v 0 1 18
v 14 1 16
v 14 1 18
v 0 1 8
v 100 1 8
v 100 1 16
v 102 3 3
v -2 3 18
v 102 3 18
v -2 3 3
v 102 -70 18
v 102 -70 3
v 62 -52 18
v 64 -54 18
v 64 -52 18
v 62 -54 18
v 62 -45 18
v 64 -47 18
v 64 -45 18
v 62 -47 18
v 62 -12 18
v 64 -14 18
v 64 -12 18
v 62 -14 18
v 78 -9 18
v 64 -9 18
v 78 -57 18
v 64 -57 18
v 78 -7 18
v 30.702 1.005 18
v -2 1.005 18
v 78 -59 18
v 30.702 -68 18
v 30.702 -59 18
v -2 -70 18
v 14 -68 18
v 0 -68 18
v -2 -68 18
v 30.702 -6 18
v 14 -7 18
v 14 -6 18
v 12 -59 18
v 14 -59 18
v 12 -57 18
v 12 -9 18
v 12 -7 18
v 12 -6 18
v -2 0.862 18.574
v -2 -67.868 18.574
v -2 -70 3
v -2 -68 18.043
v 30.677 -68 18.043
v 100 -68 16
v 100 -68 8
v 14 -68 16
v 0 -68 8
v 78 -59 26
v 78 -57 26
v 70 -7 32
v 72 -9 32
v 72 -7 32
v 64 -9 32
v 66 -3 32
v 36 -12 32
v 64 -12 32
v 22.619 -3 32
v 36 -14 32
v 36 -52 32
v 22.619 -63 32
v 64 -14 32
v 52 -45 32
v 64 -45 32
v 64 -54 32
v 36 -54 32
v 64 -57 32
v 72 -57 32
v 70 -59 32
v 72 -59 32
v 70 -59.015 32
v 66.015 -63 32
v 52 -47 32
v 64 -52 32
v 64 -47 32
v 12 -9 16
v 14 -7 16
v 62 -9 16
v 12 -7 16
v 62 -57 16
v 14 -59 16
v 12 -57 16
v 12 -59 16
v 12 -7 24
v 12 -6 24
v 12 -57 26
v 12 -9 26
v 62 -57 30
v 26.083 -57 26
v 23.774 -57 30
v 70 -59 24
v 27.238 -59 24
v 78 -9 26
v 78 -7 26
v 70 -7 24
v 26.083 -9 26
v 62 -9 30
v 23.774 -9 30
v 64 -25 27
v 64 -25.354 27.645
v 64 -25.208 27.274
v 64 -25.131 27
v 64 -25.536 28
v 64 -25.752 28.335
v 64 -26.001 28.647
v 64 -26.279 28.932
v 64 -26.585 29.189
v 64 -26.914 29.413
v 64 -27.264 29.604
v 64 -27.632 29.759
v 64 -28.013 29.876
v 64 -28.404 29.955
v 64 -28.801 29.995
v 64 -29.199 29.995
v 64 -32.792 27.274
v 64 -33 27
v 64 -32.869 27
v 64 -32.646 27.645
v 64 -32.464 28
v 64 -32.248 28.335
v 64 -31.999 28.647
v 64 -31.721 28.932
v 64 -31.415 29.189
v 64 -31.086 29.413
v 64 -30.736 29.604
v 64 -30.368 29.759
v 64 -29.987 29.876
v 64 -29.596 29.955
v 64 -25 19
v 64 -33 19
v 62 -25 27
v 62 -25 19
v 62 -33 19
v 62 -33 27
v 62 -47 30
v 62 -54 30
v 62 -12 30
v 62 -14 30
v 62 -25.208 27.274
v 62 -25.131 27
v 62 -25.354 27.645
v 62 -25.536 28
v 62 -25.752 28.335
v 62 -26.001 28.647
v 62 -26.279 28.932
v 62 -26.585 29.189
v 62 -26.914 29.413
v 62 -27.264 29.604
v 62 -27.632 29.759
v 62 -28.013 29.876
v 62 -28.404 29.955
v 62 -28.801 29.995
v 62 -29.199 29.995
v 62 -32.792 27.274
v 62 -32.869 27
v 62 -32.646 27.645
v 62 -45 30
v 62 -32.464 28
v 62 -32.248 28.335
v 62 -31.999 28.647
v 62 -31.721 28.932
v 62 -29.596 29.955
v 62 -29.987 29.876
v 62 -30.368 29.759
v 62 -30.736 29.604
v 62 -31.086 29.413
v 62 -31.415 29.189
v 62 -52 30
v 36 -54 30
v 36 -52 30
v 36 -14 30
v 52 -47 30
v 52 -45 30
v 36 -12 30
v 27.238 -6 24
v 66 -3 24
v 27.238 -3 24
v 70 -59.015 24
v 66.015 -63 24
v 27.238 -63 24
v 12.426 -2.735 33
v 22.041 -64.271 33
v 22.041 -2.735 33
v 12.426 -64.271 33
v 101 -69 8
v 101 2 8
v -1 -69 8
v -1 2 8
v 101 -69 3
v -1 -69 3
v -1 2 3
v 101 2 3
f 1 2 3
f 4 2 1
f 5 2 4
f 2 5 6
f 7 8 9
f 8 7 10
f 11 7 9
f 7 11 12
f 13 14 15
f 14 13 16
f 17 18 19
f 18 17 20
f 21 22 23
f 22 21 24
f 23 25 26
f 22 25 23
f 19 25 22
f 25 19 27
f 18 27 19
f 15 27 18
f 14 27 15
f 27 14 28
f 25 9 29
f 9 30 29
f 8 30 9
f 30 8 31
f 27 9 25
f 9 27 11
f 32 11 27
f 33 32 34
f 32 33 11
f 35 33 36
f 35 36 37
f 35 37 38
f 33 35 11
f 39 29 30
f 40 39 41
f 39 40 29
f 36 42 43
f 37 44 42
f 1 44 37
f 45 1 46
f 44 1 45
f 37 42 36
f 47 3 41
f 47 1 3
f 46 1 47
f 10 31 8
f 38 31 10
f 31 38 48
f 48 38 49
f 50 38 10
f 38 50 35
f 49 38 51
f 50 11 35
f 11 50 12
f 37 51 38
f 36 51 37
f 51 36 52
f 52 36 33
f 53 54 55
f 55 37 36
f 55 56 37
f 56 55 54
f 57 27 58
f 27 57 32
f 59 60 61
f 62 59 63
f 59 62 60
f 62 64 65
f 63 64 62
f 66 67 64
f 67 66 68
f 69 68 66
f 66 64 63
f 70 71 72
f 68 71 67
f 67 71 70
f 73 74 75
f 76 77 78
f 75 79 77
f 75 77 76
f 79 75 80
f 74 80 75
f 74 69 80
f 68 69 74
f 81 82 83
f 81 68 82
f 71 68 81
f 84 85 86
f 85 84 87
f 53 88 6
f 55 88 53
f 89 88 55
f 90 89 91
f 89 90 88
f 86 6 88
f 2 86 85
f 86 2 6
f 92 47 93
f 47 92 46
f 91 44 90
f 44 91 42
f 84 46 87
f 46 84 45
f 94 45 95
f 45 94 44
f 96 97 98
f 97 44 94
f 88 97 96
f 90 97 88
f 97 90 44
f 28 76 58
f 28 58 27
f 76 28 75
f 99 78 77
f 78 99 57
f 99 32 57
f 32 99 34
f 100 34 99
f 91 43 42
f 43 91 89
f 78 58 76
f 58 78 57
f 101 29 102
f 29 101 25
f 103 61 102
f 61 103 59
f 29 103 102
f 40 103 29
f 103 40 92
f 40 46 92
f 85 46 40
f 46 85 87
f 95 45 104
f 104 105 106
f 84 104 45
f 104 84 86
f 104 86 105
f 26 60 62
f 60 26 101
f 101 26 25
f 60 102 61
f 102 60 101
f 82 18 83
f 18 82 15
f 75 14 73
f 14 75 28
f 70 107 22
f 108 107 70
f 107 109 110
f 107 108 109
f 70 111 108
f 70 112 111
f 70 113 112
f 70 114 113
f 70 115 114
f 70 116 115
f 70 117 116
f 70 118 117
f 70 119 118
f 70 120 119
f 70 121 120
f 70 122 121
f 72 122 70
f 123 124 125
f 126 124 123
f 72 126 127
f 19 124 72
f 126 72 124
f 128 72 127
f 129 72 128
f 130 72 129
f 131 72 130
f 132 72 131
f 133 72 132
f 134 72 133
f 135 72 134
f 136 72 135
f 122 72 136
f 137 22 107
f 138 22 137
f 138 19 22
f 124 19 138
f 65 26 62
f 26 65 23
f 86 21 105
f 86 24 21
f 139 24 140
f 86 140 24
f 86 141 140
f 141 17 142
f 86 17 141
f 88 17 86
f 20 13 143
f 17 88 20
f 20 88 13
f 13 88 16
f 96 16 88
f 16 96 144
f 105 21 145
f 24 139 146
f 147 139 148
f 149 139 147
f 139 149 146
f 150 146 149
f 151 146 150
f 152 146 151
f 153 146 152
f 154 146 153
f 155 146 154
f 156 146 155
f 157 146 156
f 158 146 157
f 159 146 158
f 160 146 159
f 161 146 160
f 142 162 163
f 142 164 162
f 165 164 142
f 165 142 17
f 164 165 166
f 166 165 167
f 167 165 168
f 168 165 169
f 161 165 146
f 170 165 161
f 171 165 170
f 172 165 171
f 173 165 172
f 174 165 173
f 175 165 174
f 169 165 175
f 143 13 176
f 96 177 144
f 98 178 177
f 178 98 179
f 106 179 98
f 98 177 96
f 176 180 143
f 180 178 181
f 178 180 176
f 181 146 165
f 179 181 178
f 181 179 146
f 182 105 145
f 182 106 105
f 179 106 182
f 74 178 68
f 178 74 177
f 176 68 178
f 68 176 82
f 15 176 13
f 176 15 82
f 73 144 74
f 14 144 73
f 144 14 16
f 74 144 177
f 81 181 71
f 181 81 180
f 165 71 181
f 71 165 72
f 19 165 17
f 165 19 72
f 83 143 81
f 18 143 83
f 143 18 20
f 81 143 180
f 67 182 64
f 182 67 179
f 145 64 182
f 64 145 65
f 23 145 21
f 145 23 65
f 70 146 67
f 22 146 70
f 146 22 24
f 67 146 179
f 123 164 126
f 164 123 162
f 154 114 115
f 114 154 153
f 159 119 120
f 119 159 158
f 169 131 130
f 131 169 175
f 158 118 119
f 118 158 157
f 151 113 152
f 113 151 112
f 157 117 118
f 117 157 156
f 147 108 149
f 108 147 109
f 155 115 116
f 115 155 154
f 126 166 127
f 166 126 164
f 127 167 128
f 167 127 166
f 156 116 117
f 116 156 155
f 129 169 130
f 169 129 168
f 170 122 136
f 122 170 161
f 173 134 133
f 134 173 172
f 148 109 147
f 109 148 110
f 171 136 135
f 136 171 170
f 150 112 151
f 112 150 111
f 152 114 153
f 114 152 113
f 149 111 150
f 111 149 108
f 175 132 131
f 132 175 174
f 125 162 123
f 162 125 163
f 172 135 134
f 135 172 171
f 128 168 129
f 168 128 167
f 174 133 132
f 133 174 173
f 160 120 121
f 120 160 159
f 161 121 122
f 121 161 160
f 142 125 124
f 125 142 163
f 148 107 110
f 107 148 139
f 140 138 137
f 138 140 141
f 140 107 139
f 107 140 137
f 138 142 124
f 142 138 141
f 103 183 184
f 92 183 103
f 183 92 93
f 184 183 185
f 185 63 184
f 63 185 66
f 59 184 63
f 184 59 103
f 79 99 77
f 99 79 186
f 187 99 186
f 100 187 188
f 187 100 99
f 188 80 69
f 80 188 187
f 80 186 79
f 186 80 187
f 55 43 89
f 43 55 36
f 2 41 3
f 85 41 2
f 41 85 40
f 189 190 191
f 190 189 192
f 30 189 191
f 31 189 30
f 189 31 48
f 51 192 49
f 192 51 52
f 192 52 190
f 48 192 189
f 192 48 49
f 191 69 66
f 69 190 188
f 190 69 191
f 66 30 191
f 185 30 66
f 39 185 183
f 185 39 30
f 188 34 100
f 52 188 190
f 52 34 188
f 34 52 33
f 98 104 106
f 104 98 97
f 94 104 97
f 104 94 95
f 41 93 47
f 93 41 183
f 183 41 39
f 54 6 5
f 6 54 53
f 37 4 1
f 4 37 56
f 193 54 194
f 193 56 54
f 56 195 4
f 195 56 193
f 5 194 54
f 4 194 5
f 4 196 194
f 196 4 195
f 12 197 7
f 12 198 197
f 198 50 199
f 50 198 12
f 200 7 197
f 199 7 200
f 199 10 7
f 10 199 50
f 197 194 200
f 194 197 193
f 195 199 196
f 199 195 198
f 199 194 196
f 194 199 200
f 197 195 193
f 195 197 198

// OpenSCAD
$fa = 1;
$fs = .4;

upPart = true;
downPart = false;
downPart2 = false;

// batteries
//color([1, 0, 0, .9]) batteries();

// case
//case();

if(upPart){

  difference(){
    case();
    translate([-5, -90, -22])
      cube([110, 110, 30]);
  }
  
  // edge
  difference() {
    translate([-2, -70, 3])
      cube([104, 73, 10]);
    translate([-1, -69, 3])
      cube([102, 71, 10]);
  }
}

if(downPart){
  
  difference(){
    case();
    translate([-5, -90, 5])
      cube([110, 110, 30]);
  }
  
  // edge
  difference() {
    translate([-1, -69, 0])
      cube([102, 71, 10]);
    translate([0, -68, 0])
      cube([100, 69, 10]);
  }
}

if(downPart2){

  difference(){
    case();
    translate([-5, -90, 5])
      cube([110, 110, 30]);
  }
  
  // edge
  translate([0, 0, 18])
  difference() {
    translate([-1, -69, 0])
      cube([102, 71, 10]);
    translate([0, -68, 0])
      cube([100, 69, 10]);
  }
  
  // taller
  translate([0, 0, 5])
  difference() {
    translate([-2, -70, 0])
      cube([104, 73, 18]);
    translate([0, -68, 0])
      cube([100, 69, 18]);
  }

}

// batteries
module batteries(){
  translate([10, 0, 0])
  rotate([90, 0, 0])
  hull(){
    translate([0,0,0])
      cylinder(65, 10, 10);
    translate([80,0,0])
      cylinder(65, 10, 10);
  }

  //panel
  translate([10, -64, 6])
    cube([86, 62, 10]);
  // plug
  translate([25, -50, 16])
    cube([26, 36, 10]);
  // spring
  translate([6,-30,0])
    cylinder(19, 2.5, 2.5);
}


module case() {
  // sides
  side();
  translate([0, -71, 0])
    side();
  module side(){
    translate([10, 3, 0])
    rotate([90, 0, 0])
    hull(){
      translate([0, 0, 0])
        cylinder(2, 12, 12);
      translate([80,0,0])
        cylinder(2, 12, 12);
    }

    translate([-2, 1, 0])
      cube([104, 2, 18]);
  }

  // bottom
  translate([9, -68, -12])
    cube([82, 71, 2]);
  rotate([90, 0, 0])
    translate([10, 0, -3])
      difference() {
        cylinder(71, 12, 12);
        cylinder(71, 11, 11);
        translate([-12, 0, 0])
          cube([24, 12, 72]);
        translate([0, -12, 0])
          cube([24, 12, 72]);
      }
  rotate([90, 0, 0])    
    translate([90, 0, -3])
      difference() {
        cylinder(71, 12, 12);
        cylinder(71, 11, 11);
        translate([-12, -12, 0])
          cube([12, 24, 72]);
        translate([-12, 0, 0])
          cube([24, 12, 72]);
      }

      
   // top
   top();
   module top(){
      translate([62, -68, 16])
        cube([40, 71, 2]);

      // left
      translate([14, -68, 16])
         cube([48, 9, 2]);
      difference(){
         translate([12, -59, 16])
            cube([66, 2, 16]);
         translate([71, -63, 33])
            rotate([0, 45, 0])
               cube([10, 10, 10]);
      }

      // right
      translate([14, -7, 16])
        cube([48, 8, 2]);
      difference(){
         translate([12, -9, 16])    
            cube([66, 2, 16]);
         translate([71, -10, 33])
            rotate([0, 45, 0])
               cube([10, 10, 10]);
      }

      // top  
      translate([42, -60, 16])
         difference(){
           union() {
             translate([20, 1, 0])
               cube([2, 52, 16]);
             translate([-30, 1, 14])
               cube([52, 52, 2]);
          }
          
          // poles
          translate([-6, 6, 2])
            cube([34, 2, 16]);
          translate([10, 13, 2])
            cube([34, 2, 16]);
          translate([-6, 46, 2])
            cube([34, 2, 16]);
          
          // connector
          translate([-2, 31, 10])
            rotate([0, 90, 0])
              cylinder(30, 4, 4);          
          translate([15, 27, 3])
            cube([10, 8, 8]);
      }
      
      // rails
      difference(){
         translate([12, -7, 24])
           cube([58, 4, 8]);
         translate([70, -7, 20])
            rotate([0, 0, 45])
               cube([6, 6, 20]);
      }
      difference(){
         translate([12, -63, 24])
            cube([58, 4, 8]);      
         translate([70, -67.5, 20])
            rotate([0, 0, 45])
               cube([6, 6, 20]);
      }
       
   }
   
  // front
  translate([100, -68, 0])    
      cube([2, 71, 18]);

  //back
  translate([-2, -68, 0])    
      cube([2, 71, 18]);
  
  // shoulder
  shoulder();
  module shoulder() {
      difference() {
         translate([-2, -68, 18])
            cube([35, 71, 15]);
        
         //side
         translate([-4, 3, 10])
            rotate([14, 0, 0])
               cube([40,40,40]);
         //side
         translate([-4, -72, 2])
            rotate([76, 0, 0])
               cube([40,40,40]);

         // back
         translate([-30, -70, 33])
            rotate([0, 45, 0])
               cube([30,80,30]);
         // right
         translate([18, -70, 40])
            rotate([0, 60, 0])
               cube([50,100,50]);
         // bottom
         translate([12, -58, 10])
            cube([50, 52, 16]);
        // top
        //translate([5, -74, 30])
          //  cube([10, 80, 10]);
      }
  }
}
